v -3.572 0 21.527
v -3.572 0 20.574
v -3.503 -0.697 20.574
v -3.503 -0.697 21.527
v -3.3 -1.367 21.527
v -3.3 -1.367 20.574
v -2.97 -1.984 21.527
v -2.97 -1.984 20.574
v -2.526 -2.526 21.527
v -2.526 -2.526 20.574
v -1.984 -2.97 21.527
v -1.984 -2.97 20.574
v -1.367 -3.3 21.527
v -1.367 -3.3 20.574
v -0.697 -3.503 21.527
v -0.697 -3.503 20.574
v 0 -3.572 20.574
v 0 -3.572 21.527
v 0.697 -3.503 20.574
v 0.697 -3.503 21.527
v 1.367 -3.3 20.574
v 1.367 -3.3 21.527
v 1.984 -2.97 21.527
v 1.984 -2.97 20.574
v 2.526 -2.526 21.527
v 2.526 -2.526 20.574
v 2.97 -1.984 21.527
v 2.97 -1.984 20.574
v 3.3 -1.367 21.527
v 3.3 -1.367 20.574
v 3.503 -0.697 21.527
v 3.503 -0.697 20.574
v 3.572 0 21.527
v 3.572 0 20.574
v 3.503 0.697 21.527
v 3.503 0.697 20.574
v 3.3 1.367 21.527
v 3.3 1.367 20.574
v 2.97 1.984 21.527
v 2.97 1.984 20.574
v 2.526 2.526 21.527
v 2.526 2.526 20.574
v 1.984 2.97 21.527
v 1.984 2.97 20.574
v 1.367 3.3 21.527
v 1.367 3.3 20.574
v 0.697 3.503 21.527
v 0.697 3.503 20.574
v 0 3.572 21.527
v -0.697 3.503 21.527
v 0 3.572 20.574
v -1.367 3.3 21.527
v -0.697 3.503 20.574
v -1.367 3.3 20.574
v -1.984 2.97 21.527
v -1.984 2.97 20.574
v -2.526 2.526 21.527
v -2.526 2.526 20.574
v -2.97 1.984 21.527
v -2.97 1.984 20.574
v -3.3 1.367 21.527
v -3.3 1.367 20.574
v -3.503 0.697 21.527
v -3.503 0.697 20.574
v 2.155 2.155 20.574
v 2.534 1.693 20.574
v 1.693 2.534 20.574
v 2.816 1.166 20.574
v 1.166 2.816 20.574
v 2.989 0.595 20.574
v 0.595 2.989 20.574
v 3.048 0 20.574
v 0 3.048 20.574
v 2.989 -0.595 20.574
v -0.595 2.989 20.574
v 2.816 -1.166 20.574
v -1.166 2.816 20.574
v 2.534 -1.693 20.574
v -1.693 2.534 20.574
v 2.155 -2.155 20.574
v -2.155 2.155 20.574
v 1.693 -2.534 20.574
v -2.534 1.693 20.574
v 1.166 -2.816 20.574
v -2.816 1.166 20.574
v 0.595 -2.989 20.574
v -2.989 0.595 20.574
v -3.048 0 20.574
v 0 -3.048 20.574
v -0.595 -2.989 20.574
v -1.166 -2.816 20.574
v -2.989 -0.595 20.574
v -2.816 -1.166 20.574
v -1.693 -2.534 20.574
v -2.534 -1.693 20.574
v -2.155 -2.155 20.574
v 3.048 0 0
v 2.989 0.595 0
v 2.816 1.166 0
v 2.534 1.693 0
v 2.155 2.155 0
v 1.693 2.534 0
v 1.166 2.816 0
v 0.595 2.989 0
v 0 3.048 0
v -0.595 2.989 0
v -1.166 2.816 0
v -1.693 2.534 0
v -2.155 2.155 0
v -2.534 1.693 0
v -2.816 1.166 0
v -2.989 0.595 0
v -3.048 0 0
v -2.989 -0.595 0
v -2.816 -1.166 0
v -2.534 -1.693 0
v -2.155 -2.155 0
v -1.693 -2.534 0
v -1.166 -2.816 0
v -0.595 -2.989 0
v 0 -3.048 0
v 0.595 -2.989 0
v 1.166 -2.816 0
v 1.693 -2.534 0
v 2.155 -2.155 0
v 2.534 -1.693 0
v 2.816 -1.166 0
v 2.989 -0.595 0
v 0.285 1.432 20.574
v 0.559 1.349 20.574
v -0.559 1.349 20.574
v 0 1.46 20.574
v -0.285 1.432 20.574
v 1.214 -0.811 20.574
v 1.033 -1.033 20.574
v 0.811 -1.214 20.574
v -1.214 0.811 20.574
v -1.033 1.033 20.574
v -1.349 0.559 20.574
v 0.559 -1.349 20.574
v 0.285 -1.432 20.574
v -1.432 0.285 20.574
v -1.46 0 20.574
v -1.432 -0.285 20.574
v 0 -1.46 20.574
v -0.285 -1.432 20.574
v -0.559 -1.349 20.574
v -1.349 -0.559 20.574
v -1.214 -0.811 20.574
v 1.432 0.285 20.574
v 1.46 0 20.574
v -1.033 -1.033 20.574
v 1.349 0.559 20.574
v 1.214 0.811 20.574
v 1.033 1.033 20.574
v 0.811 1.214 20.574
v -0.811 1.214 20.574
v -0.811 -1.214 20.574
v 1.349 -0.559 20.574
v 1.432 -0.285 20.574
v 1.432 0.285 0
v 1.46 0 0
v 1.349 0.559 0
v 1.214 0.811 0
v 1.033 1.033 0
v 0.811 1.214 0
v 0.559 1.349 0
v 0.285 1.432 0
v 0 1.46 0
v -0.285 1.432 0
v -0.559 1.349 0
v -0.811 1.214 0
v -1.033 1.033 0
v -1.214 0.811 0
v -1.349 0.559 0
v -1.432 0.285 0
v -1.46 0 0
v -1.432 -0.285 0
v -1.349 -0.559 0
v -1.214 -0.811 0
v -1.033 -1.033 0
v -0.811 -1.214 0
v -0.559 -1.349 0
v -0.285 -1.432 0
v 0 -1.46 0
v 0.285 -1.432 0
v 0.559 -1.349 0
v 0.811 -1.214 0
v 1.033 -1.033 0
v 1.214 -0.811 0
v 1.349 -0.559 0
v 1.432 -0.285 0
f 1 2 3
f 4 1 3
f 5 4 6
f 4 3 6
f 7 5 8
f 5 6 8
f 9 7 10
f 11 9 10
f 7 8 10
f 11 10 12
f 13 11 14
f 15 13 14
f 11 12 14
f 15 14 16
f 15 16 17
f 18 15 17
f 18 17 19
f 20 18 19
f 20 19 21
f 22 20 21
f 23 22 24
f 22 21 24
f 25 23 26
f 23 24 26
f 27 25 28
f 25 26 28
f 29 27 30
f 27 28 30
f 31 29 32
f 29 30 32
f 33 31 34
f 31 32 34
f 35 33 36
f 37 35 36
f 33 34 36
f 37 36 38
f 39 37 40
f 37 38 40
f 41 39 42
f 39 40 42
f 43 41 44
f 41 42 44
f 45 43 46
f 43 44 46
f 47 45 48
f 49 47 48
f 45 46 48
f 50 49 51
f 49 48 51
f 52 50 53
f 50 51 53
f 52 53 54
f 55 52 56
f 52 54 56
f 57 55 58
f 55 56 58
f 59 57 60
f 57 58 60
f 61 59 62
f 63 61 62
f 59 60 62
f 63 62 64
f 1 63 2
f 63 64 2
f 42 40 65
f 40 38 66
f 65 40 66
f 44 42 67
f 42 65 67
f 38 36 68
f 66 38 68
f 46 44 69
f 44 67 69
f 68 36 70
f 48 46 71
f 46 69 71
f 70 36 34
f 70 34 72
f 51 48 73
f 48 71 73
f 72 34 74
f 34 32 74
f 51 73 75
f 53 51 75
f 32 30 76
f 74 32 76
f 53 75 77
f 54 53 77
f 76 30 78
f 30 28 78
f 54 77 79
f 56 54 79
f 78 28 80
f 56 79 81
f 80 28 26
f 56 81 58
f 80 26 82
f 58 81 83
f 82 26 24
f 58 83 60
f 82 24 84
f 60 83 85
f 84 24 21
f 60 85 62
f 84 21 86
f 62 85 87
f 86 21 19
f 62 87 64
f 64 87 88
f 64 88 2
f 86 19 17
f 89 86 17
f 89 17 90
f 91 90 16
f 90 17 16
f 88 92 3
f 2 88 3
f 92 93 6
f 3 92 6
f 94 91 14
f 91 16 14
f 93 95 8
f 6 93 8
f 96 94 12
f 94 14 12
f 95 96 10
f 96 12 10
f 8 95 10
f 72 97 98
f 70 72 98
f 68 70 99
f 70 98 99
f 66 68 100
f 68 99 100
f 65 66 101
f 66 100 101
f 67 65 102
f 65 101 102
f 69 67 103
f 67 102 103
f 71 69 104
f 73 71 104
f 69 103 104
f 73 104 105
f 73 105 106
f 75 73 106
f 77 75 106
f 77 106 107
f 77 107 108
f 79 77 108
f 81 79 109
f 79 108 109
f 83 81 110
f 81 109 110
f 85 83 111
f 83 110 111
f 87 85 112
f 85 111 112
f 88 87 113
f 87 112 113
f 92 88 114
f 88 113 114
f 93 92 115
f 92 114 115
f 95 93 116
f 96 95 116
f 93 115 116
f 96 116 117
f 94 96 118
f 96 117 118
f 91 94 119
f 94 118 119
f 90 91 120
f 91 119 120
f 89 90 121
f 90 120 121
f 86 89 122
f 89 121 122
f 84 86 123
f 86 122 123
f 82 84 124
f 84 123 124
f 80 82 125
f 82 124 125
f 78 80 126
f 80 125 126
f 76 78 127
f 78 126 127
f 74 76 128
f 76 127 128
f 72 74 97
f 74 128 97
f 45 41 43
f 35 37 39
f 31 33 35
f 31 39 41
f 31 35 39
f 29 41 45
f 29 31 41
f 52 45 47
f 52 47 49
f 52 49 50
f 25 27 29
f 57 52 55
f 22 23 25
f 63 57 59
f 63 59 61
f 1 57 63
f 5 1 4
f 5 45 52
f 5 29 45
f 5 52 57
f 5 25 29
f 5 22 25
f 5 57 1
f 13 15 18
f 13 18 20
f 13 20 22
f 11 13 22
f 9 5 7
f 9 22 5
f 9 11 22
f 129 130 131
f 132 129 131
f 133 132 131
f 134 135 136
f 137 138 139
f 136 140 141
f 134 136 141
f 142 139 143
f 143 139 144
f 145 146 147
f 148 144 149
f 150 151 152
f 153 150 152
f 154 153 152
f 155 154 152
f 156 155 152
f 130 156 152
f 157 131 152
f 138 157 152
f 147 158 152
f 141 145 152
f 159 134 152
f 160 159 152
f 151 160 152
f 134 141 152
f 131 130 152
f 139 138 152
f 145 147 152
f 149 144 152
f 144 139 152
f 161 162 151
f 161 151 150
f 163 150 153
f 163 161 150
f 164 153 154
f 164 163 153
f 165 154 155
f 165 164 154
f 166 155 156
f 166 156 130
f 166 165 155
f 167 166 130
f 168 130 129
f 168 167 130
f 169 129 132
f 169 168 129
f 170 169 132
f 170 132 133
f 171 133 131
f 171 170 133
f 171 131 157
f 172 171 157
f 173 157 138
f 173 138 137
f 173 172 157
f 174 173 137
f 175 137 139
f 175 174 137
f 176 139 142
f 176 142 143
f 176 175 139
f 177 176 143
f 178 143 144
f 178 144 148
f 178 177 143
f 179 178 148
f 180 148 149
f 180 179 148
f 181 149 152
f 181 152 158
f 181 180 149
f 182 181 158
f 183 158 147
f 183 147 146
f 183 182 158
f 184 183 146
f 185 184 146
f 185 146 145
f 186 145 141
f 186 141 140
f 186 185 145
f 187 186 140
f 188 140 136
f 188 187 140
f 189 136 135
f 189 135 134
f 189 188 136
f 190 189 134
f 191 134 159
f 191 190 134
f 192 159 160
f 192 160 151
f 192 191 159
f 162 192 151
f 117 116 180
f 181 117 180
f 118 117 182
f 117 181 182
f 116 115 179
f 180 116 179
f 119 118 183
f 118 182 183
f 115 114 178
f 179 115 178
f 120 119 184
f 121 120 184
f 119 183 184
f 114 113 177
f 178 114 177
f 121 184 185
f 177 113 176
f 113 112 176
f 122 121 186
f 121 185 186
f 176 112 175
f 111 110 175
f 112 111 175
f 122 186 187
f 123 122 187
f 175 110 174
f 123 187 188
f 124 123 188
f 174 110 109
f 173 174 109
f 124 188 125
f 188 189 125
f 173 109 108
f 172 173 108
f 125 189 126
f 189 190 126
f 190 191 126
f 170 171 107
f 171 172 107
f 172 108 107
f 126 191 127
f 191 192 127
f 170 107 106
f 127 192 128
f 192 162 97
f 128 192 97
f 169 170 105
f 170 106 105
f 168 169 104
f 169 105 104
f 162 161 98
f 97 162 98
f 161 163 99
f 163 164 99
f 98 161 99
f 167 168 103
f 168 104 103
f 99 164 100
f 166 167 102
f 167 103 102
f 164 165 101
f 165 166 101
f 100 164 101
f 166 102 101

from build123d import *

# Parameters (mm, degrees)
SKETCH1_R           = 3.048
SKETCH1_R_2         = 1.4605
BOSS_EXTRUDE1_DEPTH = 20.574
SKETCH2_R           = 3.571875
BOSS_EXTRUDE2_DEPTH = 0.9525


with BuildPart() as part:
    # Sketch1 → Boss-Extrude1 (new body)
    with BuildSketch(Plane.XY):
        Circle(SKETCH1_R)
        Circle(SKETCH1_R_2, mode=Mode.SUBTRACT)
    extrude(amount=BOSS_EXTRUDE1_DEPTH)

    # Sketch2 → Boss-Extrude2 (add)
    with BuildSketch(Plane.XY.offset(20.574)):
        with Locations(Location((0, 0, 0), (0, 0, 180))):
            Circle(SKETCH2_R)
    extrude(amount=BOSS_EXTRUDE2_DEPTH)


solid = part.part
